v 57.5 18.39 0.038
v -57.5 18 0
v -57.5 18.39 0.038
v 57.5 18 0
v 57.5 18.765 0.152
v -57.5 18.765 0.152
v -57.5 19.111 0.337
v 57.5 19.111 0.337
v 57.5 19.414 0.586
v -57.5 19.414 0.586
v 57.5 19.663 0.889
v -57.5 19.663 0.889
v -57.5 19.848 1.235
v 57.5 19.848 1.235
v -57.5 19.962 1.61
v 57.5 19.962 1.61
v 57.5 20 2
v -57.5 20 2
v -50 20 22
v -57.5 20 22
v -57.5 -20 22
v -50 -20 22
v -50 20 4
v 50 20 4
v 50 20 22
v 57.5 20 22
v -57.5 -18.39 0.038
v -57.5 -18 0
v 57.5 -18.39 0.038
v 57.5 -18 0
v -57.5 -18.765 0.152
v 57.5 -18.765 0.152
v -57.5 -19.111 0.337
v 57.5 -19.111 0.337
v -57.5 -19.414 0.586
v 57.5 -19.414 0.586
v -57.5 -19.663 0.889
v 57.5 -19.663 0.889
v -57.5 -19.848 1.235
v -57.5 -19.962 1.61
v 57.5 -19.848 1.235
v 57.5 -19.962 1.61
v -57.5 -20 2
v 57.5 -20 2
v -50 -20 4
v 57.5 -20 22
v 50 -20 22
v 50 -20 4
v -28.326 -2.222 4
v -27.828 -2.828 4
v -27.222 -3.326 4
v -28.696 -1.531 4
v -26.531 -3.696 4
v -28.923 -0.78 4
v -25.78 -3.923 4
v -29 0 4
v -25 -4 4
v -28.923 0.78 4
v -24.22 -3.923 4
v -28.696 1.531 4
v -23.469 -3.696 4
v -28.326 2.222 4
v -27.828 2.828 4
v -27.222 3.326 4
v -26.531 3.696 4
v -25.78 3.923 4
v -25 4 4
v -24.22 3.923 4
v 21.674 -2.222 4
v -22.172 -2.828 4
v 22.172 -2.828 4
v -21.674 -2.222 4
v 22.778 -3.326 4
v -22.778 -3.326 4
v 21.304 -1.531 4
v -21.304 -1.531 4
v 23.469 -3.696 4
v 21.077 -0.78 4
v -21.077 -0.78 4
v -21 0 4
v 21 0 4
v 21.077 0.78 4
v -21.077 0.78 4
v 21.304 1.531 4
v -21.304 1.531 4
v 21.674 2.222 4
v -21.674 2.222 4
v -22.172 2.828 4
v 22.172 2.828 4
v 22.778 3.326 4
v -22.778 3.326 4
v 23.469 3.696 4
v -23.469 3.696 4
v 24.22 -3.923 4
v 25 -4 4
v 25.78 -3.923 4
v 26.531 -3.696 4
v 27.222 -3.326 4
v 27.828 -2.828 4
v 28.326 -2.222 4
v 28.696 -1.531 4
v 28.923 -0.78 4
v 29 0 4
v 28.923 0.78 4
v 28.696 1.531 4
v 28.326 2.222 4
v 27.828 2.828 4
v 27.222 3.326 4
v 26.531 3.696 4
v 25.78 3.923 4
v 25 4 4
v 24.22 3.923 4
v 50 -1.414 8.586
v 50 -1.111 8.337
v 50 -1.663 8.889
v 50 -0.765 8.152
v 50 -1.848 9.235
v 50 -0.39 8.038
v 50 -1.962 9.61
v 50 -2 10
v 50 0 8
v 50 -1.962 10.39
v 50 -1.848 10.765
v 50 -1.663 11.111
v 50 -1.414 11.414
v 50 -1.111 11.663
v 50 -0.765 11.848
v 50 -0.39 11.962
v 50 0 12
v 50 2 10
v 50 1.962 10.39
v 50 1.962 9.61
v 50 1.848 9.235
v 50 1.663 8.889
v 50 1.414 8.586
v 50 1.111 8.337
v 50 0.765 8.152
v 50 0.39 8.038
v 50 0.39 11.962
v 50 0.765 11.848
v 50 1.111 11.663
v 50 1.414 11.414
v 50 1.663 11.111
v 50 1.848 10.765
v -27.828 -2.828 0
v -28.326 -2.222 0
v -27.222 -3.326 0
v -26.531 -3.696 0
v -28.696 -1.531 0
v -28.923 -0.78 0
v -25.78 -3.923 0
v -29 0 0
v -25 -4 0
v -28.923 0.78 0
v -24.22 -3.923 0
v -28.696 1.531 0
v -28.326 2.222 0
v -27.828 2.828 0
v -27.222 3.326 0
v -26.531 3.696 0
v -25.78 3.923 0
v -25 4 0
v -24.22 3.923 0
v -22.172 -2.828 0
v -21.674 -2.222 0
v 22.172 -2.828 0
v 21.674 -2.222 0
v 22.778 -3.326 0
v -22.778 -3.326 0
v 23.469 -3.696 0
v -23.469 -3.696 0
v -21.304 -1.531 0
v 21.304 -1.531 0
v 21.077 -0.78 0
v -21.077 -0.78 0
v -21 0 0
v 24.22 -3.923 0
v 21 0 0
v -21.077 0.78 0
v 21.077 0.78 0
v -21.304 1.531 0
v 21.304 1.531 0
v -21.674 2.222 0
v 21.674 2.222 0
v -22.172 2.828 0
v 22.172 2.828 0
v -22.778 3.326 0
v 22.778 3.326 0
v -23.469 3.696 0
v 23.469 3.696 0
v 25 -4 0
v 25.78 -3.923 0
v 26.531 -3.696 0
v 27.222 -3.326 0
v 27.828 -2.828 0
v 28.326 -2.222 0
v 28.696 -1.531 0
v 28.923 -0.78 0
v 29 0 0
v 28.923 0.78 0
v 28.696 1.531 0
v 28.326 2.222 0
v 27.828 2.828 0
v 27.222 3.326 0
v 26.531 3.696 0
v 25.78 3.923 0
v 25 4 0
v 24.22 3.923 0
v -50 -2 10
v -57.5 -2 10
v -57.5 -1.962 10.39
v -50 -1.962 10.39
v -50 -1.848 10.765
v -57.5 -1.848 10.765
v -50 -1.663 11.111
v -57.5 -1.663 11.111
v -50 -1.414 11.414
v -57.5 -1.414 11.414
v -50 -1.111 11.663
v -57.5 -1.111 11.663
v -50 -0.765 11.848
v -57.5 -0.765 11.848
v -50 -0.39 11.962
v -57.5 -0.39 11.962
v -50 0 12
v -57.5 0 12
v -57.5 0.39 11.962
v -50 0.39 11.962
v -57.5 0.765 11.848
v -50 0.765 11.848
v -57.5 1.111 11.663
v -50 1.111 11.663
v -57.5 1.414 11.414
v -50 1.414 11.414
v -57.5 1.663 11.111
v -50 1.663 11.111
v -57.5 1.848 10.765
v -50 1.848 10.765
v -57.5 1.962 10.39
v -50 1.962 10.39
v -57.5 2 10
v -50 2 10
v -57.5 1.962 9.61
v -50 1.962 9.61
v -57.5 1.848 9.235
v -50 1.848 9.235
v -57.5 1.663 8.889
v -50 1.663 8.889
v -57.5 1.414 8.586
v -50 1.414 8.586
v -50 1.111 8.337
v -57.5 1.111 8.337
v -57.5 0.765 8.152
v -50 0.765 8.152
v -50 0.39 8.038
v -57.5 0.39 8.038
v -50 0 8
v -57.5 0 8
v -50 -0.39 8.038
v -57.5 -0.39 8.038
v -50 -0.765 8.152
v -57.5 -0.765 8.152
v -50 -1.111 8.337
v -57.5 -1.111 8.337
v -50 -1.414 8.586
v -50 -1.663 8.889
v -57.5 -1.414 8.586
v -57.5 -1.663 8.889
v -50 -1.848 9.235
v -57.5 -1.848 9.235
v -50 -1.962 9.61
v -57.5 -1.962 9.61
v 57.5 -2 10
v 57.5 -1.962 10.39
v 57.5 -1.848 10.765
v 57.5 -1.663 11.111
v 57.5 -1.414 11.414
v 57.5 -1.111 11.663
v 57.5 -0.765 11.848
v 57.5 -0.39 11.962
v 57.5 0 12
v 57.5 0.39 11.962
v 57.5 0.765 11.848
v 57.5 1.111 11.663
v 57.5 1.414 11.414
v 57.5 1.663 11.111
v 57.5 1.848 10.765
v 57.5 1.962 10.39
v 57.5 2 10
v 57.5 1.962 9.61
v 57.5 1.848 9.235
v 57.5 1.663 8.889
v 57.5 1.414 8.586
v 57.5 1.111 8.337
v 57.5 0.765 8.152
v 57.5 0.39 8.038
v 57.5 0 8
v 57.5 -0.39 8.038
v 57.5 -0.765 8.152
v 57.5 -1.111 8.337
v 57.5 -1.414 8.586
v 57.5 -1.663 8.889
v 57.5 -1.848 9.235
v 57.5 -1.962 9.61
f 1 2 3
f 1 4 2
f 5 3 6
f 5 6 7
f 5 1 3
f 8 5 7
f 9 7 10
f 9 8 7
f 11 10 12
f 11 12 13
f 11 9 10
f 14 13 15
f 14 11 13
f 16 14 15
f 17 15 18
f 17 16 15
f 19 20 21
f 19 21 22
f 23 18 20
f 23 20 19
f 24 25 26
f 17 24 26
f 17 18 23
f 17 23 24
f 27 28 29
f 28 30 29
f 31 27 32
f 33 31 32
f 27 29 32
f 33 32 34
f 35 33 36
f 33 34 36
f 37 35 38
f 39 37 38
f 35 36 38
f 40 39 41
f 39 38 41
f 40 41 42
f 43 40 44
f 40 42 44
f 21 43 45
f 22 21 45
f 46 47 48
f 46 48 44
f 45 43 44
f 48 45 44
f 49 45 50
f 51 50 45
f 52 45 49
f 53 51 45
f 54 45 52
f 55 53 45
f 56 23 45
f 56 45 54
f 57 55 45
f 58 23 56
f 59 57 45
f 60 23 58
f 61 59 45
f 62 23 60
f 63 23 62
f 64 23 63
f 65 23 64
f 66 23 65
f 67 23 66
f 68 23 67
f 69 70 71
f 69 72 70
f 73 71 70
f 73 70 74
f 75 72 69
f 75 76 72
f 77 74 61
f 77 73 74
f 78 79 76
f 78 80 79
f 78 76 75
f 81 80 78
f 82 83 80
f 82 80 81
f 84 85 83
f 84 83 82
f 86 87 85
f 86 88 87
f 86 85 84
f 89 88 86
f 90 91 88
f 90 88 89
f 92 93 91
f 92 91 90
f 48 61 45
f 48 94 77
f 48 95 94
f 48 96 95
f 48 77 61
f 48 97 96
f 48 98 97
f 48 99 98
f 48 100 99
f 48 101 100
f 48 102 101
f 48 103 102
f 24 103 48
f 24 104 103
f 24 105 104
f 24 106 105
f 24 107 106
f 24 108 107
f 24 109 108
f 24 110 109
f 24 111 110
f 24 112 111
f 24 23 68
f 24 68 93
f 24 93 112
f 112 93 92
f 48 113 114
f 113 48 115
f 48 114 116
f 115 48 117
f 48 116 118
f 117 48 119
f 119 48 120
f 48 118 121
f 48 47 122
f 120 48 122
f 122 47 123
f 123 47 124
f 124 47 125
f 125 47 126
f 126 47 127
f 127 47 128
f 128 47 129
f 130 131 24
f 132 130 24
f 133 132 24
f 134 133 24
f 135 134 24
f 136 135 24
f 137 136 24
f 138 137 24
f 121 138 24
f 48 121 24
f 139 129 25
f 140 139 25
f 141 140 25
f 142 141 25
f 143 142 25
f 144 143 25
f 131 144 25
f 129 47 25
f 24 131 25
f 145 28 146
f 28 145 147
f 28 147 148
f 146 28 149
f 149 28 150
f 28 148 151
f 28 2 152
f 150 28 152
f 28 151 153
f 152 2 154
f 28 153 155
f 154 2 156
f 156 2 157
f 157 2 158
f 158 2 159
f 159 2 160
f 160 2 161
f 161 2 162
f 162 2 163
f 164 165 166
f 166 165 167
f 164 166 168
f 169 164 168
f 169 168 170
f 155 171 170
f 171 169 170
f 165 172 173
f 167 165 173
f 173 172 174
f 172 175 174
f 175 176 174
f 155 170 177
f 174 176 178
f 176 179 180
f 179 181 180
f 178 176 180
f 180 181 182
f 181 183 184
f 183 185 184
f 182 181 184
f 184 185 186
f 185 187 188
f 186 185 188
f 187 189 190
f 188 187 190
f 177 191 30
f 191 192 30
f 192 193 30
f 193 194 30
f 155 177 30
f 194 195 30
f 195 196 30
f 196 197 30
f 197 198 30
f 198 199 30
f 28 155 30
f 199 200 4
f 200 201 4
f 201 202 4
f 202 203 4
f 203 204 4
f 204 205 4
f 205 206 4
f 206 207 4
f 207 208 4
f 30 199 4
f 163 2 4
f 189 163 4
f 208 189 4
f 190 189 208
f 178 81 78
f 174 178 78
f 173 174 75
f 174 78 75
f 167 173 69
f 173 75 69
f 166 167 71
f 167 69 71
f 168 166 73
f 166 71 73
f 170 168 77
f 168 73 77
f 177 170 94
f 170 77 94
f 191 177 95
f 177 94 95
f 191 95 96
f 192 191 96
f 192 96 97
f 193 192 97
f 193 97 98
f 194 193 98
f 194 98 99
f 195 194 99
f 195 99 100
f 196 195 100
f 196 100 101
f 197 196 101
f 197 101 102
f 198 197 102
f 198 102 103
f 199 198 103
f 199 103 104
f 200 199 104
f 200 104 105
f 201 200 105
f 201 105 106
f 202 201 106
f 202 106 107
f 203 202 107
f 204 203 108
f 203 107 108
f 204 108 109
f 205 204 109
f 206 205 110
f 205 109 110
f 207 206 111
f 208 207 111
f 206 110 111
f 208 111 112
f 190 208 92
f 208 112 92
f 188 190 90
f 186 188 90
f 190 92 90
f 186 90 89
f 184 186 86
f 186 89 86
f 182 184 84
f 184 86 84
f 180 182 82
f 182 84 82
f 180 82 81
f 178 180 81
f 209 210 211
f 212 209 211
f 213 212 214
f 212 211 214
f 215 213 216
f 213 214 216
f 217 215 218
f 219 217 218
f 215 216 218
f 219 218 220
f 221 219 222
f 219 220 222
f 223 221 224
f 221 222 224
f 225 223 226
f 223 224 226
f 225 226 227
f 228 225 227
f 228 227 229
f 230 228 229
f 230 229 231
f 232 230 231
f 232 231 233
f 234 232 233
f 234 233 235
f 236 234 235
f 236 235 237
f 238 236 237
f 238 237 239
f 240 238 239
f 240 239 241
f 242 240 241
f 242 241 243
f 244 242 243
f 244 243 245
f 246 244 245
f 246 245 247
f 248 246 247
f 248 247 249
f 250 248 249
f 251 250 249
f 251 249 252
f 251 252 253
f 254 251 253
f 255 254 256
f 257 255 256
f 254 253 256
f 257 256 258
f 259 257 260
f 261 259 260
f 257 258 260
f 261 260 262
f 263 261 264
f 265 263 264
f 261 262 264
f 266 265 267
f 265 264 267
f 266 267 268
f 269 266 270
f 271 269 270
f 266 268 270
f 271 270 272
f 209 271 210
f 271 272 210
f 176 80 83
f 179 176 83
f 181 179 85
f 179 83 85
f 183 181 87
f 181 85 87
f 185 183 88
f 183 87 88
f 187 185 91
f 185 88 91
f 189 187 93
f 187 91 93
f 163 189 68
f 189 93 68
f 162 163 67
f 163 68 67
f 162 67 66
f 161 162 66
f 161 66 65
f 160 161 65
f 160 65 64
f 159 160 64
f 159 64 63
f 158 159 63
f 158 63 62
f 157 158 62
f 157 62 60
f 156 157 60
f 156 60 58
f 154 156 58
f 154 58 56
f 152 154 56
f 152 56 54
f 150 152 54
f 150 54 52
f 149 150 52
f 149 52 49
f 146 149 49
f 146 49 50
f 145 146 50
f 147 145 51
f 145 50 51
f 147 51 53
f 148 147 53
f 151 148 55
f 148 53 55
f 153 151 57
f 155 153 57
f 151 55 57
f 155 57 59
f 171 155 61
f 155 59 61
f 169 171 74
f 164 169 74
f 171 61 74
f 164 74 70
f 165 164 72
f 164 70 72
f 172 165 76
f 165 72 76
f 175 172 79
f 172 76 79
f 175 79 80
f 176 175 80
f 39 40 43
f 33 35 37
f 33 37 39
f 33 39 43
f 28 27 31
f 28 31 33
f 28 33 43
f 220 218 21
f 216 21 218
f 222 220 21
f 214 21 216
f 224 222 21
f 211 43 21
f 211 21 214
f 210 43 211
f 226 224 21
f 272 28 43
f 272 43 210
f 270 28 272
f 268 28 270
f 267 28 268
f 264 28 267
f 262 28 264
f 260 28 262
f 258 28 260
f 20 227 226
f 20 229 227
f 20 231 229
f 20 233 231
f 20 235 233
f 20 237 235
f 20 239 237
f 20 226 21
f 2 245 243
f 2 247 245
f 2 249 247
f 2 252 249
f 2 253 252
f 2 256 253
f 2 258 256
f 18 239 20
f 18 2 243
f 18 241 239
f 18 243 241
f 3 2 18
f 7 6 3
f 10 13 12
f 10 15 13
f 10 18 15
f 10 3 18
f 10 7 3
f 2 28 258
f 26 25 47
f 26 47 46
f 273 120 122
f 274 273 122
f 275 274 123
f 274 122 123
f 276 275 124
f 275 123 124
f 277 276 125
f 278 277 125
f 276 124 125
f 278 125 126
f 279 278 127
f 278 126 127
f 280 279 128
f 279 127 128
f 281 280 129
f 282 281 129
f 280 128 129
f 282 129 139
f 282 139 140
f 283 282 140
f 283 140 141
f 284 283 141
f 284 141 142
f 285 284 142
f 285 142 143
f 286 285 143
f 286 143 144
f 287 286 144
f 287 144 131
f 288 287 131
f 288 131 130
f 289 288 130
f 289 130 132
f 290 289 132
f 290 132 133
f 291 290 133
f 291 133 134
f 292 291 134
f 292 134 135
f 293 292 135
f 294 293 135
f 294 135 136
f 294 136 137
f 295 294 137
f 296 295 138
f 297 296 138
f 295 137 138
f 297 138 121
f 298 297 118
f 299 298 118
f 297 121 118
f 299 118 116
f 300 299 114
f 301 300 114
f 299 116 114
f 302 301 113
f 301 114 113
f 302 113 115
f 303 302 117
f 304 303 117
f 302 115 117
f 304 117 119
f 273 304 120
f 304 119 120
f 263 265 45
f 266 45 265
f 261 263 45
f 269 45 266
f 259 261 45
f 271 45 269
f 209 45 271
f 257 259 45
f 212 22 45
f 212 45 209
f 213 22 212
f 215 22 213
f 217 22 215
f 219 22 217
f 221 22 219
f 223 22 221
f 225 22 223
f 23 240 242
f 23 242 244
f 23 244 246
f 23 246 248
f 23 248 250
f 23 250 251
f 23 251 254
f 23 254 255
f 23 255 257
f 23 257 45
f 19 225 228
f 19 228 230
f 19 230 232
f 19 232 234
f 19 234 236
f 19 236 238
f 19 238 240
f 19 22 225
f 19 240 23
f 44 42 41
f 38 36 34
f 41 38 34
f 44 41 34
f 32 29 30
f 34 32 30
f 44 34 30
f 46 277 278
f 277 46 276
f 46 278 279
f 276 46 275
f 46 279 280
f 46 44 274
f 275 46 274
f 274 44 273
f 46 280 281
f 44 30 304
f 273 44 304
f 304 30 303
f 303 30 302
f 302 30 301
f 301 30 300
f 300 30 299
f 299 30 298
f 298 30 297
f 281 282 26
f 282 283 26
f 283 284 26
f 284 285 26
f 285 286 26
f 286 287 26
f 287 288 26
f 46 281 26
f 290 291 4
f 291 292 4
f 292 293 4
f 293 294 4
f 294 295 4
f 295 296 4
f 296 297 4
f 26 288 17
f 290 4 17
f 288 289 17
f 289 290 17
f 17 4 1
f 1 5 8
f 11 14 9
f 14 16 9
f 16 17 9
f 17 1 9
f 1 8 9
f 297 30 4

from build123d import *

# Parameters (mm, degrees)
SKETCH_2_W          = 115
SKETCH_2_H          = 40
EXTRUDE_1_DEPTH     = 25
SKETCH_3_W          = 100
SKETCH_3_H          = 40
CUT_EXTRUDE_1_DEPTH = 21
SKETCH_5_R          = 2
CUT_EXTRUDE_2_DEPTH = 138
FILLET_1_R          = 2
FILLET_2_R          = 2
SKETCH_6_R          = 4
CUT_EXTRUDE_3_DEPTH = 9
SKETCH_7_W          = 115
SKETCH_7_H          = 40
CUT_EXTRUDE_4_DEPTH = 3


with BuildPart() as part:
    # 草图2 → 凸台-拉伸1 (new body)
    with BuildSketch(Plane.XY):
        Rectangle(SKETCH_2_W, SKETCH_2_H)
    extrude(amount=EXTRUDE_1_DEPTH)

    # 草图3 → 切除-拉伸1 (cut)
    with BuildSketch(Plane.XY.offset(25)):
        Rectangle(SKETCH_3_W, SKETCH_3_H)
    extrude(amount=-CUT_EXTRUDE_1_DEPTH, mode=Mode.SUBTRACT)

    # 草图5 → 切除-拉伸2 (cut)
    with BuildSketch(Plane.ZY.offset(57.5)):
        with Locations(Location((10, 0, 0), (0, 0, 270))):
            Circle(SKETCH_5_R)
    extrude(amount=-CUT_EXTRUDE_2_DEPTH, mode=Mode.SUBTRACT)

    # 圆角1
    fillet_1_edges = [part.edges().sort_by_distance(p)[0] for p in [
        (0, 20, 0),
    ]]
    fillet(fillet_1_edges, radius=FILLET_1_R)

    # 圆角2
    fillet_2_edges = [part.edges().sort_by_distance(p)[0] for p in [
        (0, -20, 0),
    ]]
    fillet(fillet_2_edges, radius=FILLET_2_R)

    # 草图6 → 切除-拉伸3 (cut)
    with BuildSketch(Plane.XY.offset(4)):
        with Locations((-25, 0)):
            Circle(SKETCH_6_R)
        with Locations(Location((25, 0, 0), (0, 0, 180))):
            Circle(SKETCH_6_R)
    extrude(amount=-CUT_EXTRUDE_3_DEPTH, mode=Mode.SUBTRACT)

    # 草图7 → 切除-拉伸4 (cut)
    with BuildSketch(Plane.XY.offset(25)):
        Rectangle(SKETCH_7_W, SKETCH_7_H)
    extrude(amount=-CUT_EXTRUDE_4_DEPTH, mode=Mode.SUBTRACT)


solid = part.part
